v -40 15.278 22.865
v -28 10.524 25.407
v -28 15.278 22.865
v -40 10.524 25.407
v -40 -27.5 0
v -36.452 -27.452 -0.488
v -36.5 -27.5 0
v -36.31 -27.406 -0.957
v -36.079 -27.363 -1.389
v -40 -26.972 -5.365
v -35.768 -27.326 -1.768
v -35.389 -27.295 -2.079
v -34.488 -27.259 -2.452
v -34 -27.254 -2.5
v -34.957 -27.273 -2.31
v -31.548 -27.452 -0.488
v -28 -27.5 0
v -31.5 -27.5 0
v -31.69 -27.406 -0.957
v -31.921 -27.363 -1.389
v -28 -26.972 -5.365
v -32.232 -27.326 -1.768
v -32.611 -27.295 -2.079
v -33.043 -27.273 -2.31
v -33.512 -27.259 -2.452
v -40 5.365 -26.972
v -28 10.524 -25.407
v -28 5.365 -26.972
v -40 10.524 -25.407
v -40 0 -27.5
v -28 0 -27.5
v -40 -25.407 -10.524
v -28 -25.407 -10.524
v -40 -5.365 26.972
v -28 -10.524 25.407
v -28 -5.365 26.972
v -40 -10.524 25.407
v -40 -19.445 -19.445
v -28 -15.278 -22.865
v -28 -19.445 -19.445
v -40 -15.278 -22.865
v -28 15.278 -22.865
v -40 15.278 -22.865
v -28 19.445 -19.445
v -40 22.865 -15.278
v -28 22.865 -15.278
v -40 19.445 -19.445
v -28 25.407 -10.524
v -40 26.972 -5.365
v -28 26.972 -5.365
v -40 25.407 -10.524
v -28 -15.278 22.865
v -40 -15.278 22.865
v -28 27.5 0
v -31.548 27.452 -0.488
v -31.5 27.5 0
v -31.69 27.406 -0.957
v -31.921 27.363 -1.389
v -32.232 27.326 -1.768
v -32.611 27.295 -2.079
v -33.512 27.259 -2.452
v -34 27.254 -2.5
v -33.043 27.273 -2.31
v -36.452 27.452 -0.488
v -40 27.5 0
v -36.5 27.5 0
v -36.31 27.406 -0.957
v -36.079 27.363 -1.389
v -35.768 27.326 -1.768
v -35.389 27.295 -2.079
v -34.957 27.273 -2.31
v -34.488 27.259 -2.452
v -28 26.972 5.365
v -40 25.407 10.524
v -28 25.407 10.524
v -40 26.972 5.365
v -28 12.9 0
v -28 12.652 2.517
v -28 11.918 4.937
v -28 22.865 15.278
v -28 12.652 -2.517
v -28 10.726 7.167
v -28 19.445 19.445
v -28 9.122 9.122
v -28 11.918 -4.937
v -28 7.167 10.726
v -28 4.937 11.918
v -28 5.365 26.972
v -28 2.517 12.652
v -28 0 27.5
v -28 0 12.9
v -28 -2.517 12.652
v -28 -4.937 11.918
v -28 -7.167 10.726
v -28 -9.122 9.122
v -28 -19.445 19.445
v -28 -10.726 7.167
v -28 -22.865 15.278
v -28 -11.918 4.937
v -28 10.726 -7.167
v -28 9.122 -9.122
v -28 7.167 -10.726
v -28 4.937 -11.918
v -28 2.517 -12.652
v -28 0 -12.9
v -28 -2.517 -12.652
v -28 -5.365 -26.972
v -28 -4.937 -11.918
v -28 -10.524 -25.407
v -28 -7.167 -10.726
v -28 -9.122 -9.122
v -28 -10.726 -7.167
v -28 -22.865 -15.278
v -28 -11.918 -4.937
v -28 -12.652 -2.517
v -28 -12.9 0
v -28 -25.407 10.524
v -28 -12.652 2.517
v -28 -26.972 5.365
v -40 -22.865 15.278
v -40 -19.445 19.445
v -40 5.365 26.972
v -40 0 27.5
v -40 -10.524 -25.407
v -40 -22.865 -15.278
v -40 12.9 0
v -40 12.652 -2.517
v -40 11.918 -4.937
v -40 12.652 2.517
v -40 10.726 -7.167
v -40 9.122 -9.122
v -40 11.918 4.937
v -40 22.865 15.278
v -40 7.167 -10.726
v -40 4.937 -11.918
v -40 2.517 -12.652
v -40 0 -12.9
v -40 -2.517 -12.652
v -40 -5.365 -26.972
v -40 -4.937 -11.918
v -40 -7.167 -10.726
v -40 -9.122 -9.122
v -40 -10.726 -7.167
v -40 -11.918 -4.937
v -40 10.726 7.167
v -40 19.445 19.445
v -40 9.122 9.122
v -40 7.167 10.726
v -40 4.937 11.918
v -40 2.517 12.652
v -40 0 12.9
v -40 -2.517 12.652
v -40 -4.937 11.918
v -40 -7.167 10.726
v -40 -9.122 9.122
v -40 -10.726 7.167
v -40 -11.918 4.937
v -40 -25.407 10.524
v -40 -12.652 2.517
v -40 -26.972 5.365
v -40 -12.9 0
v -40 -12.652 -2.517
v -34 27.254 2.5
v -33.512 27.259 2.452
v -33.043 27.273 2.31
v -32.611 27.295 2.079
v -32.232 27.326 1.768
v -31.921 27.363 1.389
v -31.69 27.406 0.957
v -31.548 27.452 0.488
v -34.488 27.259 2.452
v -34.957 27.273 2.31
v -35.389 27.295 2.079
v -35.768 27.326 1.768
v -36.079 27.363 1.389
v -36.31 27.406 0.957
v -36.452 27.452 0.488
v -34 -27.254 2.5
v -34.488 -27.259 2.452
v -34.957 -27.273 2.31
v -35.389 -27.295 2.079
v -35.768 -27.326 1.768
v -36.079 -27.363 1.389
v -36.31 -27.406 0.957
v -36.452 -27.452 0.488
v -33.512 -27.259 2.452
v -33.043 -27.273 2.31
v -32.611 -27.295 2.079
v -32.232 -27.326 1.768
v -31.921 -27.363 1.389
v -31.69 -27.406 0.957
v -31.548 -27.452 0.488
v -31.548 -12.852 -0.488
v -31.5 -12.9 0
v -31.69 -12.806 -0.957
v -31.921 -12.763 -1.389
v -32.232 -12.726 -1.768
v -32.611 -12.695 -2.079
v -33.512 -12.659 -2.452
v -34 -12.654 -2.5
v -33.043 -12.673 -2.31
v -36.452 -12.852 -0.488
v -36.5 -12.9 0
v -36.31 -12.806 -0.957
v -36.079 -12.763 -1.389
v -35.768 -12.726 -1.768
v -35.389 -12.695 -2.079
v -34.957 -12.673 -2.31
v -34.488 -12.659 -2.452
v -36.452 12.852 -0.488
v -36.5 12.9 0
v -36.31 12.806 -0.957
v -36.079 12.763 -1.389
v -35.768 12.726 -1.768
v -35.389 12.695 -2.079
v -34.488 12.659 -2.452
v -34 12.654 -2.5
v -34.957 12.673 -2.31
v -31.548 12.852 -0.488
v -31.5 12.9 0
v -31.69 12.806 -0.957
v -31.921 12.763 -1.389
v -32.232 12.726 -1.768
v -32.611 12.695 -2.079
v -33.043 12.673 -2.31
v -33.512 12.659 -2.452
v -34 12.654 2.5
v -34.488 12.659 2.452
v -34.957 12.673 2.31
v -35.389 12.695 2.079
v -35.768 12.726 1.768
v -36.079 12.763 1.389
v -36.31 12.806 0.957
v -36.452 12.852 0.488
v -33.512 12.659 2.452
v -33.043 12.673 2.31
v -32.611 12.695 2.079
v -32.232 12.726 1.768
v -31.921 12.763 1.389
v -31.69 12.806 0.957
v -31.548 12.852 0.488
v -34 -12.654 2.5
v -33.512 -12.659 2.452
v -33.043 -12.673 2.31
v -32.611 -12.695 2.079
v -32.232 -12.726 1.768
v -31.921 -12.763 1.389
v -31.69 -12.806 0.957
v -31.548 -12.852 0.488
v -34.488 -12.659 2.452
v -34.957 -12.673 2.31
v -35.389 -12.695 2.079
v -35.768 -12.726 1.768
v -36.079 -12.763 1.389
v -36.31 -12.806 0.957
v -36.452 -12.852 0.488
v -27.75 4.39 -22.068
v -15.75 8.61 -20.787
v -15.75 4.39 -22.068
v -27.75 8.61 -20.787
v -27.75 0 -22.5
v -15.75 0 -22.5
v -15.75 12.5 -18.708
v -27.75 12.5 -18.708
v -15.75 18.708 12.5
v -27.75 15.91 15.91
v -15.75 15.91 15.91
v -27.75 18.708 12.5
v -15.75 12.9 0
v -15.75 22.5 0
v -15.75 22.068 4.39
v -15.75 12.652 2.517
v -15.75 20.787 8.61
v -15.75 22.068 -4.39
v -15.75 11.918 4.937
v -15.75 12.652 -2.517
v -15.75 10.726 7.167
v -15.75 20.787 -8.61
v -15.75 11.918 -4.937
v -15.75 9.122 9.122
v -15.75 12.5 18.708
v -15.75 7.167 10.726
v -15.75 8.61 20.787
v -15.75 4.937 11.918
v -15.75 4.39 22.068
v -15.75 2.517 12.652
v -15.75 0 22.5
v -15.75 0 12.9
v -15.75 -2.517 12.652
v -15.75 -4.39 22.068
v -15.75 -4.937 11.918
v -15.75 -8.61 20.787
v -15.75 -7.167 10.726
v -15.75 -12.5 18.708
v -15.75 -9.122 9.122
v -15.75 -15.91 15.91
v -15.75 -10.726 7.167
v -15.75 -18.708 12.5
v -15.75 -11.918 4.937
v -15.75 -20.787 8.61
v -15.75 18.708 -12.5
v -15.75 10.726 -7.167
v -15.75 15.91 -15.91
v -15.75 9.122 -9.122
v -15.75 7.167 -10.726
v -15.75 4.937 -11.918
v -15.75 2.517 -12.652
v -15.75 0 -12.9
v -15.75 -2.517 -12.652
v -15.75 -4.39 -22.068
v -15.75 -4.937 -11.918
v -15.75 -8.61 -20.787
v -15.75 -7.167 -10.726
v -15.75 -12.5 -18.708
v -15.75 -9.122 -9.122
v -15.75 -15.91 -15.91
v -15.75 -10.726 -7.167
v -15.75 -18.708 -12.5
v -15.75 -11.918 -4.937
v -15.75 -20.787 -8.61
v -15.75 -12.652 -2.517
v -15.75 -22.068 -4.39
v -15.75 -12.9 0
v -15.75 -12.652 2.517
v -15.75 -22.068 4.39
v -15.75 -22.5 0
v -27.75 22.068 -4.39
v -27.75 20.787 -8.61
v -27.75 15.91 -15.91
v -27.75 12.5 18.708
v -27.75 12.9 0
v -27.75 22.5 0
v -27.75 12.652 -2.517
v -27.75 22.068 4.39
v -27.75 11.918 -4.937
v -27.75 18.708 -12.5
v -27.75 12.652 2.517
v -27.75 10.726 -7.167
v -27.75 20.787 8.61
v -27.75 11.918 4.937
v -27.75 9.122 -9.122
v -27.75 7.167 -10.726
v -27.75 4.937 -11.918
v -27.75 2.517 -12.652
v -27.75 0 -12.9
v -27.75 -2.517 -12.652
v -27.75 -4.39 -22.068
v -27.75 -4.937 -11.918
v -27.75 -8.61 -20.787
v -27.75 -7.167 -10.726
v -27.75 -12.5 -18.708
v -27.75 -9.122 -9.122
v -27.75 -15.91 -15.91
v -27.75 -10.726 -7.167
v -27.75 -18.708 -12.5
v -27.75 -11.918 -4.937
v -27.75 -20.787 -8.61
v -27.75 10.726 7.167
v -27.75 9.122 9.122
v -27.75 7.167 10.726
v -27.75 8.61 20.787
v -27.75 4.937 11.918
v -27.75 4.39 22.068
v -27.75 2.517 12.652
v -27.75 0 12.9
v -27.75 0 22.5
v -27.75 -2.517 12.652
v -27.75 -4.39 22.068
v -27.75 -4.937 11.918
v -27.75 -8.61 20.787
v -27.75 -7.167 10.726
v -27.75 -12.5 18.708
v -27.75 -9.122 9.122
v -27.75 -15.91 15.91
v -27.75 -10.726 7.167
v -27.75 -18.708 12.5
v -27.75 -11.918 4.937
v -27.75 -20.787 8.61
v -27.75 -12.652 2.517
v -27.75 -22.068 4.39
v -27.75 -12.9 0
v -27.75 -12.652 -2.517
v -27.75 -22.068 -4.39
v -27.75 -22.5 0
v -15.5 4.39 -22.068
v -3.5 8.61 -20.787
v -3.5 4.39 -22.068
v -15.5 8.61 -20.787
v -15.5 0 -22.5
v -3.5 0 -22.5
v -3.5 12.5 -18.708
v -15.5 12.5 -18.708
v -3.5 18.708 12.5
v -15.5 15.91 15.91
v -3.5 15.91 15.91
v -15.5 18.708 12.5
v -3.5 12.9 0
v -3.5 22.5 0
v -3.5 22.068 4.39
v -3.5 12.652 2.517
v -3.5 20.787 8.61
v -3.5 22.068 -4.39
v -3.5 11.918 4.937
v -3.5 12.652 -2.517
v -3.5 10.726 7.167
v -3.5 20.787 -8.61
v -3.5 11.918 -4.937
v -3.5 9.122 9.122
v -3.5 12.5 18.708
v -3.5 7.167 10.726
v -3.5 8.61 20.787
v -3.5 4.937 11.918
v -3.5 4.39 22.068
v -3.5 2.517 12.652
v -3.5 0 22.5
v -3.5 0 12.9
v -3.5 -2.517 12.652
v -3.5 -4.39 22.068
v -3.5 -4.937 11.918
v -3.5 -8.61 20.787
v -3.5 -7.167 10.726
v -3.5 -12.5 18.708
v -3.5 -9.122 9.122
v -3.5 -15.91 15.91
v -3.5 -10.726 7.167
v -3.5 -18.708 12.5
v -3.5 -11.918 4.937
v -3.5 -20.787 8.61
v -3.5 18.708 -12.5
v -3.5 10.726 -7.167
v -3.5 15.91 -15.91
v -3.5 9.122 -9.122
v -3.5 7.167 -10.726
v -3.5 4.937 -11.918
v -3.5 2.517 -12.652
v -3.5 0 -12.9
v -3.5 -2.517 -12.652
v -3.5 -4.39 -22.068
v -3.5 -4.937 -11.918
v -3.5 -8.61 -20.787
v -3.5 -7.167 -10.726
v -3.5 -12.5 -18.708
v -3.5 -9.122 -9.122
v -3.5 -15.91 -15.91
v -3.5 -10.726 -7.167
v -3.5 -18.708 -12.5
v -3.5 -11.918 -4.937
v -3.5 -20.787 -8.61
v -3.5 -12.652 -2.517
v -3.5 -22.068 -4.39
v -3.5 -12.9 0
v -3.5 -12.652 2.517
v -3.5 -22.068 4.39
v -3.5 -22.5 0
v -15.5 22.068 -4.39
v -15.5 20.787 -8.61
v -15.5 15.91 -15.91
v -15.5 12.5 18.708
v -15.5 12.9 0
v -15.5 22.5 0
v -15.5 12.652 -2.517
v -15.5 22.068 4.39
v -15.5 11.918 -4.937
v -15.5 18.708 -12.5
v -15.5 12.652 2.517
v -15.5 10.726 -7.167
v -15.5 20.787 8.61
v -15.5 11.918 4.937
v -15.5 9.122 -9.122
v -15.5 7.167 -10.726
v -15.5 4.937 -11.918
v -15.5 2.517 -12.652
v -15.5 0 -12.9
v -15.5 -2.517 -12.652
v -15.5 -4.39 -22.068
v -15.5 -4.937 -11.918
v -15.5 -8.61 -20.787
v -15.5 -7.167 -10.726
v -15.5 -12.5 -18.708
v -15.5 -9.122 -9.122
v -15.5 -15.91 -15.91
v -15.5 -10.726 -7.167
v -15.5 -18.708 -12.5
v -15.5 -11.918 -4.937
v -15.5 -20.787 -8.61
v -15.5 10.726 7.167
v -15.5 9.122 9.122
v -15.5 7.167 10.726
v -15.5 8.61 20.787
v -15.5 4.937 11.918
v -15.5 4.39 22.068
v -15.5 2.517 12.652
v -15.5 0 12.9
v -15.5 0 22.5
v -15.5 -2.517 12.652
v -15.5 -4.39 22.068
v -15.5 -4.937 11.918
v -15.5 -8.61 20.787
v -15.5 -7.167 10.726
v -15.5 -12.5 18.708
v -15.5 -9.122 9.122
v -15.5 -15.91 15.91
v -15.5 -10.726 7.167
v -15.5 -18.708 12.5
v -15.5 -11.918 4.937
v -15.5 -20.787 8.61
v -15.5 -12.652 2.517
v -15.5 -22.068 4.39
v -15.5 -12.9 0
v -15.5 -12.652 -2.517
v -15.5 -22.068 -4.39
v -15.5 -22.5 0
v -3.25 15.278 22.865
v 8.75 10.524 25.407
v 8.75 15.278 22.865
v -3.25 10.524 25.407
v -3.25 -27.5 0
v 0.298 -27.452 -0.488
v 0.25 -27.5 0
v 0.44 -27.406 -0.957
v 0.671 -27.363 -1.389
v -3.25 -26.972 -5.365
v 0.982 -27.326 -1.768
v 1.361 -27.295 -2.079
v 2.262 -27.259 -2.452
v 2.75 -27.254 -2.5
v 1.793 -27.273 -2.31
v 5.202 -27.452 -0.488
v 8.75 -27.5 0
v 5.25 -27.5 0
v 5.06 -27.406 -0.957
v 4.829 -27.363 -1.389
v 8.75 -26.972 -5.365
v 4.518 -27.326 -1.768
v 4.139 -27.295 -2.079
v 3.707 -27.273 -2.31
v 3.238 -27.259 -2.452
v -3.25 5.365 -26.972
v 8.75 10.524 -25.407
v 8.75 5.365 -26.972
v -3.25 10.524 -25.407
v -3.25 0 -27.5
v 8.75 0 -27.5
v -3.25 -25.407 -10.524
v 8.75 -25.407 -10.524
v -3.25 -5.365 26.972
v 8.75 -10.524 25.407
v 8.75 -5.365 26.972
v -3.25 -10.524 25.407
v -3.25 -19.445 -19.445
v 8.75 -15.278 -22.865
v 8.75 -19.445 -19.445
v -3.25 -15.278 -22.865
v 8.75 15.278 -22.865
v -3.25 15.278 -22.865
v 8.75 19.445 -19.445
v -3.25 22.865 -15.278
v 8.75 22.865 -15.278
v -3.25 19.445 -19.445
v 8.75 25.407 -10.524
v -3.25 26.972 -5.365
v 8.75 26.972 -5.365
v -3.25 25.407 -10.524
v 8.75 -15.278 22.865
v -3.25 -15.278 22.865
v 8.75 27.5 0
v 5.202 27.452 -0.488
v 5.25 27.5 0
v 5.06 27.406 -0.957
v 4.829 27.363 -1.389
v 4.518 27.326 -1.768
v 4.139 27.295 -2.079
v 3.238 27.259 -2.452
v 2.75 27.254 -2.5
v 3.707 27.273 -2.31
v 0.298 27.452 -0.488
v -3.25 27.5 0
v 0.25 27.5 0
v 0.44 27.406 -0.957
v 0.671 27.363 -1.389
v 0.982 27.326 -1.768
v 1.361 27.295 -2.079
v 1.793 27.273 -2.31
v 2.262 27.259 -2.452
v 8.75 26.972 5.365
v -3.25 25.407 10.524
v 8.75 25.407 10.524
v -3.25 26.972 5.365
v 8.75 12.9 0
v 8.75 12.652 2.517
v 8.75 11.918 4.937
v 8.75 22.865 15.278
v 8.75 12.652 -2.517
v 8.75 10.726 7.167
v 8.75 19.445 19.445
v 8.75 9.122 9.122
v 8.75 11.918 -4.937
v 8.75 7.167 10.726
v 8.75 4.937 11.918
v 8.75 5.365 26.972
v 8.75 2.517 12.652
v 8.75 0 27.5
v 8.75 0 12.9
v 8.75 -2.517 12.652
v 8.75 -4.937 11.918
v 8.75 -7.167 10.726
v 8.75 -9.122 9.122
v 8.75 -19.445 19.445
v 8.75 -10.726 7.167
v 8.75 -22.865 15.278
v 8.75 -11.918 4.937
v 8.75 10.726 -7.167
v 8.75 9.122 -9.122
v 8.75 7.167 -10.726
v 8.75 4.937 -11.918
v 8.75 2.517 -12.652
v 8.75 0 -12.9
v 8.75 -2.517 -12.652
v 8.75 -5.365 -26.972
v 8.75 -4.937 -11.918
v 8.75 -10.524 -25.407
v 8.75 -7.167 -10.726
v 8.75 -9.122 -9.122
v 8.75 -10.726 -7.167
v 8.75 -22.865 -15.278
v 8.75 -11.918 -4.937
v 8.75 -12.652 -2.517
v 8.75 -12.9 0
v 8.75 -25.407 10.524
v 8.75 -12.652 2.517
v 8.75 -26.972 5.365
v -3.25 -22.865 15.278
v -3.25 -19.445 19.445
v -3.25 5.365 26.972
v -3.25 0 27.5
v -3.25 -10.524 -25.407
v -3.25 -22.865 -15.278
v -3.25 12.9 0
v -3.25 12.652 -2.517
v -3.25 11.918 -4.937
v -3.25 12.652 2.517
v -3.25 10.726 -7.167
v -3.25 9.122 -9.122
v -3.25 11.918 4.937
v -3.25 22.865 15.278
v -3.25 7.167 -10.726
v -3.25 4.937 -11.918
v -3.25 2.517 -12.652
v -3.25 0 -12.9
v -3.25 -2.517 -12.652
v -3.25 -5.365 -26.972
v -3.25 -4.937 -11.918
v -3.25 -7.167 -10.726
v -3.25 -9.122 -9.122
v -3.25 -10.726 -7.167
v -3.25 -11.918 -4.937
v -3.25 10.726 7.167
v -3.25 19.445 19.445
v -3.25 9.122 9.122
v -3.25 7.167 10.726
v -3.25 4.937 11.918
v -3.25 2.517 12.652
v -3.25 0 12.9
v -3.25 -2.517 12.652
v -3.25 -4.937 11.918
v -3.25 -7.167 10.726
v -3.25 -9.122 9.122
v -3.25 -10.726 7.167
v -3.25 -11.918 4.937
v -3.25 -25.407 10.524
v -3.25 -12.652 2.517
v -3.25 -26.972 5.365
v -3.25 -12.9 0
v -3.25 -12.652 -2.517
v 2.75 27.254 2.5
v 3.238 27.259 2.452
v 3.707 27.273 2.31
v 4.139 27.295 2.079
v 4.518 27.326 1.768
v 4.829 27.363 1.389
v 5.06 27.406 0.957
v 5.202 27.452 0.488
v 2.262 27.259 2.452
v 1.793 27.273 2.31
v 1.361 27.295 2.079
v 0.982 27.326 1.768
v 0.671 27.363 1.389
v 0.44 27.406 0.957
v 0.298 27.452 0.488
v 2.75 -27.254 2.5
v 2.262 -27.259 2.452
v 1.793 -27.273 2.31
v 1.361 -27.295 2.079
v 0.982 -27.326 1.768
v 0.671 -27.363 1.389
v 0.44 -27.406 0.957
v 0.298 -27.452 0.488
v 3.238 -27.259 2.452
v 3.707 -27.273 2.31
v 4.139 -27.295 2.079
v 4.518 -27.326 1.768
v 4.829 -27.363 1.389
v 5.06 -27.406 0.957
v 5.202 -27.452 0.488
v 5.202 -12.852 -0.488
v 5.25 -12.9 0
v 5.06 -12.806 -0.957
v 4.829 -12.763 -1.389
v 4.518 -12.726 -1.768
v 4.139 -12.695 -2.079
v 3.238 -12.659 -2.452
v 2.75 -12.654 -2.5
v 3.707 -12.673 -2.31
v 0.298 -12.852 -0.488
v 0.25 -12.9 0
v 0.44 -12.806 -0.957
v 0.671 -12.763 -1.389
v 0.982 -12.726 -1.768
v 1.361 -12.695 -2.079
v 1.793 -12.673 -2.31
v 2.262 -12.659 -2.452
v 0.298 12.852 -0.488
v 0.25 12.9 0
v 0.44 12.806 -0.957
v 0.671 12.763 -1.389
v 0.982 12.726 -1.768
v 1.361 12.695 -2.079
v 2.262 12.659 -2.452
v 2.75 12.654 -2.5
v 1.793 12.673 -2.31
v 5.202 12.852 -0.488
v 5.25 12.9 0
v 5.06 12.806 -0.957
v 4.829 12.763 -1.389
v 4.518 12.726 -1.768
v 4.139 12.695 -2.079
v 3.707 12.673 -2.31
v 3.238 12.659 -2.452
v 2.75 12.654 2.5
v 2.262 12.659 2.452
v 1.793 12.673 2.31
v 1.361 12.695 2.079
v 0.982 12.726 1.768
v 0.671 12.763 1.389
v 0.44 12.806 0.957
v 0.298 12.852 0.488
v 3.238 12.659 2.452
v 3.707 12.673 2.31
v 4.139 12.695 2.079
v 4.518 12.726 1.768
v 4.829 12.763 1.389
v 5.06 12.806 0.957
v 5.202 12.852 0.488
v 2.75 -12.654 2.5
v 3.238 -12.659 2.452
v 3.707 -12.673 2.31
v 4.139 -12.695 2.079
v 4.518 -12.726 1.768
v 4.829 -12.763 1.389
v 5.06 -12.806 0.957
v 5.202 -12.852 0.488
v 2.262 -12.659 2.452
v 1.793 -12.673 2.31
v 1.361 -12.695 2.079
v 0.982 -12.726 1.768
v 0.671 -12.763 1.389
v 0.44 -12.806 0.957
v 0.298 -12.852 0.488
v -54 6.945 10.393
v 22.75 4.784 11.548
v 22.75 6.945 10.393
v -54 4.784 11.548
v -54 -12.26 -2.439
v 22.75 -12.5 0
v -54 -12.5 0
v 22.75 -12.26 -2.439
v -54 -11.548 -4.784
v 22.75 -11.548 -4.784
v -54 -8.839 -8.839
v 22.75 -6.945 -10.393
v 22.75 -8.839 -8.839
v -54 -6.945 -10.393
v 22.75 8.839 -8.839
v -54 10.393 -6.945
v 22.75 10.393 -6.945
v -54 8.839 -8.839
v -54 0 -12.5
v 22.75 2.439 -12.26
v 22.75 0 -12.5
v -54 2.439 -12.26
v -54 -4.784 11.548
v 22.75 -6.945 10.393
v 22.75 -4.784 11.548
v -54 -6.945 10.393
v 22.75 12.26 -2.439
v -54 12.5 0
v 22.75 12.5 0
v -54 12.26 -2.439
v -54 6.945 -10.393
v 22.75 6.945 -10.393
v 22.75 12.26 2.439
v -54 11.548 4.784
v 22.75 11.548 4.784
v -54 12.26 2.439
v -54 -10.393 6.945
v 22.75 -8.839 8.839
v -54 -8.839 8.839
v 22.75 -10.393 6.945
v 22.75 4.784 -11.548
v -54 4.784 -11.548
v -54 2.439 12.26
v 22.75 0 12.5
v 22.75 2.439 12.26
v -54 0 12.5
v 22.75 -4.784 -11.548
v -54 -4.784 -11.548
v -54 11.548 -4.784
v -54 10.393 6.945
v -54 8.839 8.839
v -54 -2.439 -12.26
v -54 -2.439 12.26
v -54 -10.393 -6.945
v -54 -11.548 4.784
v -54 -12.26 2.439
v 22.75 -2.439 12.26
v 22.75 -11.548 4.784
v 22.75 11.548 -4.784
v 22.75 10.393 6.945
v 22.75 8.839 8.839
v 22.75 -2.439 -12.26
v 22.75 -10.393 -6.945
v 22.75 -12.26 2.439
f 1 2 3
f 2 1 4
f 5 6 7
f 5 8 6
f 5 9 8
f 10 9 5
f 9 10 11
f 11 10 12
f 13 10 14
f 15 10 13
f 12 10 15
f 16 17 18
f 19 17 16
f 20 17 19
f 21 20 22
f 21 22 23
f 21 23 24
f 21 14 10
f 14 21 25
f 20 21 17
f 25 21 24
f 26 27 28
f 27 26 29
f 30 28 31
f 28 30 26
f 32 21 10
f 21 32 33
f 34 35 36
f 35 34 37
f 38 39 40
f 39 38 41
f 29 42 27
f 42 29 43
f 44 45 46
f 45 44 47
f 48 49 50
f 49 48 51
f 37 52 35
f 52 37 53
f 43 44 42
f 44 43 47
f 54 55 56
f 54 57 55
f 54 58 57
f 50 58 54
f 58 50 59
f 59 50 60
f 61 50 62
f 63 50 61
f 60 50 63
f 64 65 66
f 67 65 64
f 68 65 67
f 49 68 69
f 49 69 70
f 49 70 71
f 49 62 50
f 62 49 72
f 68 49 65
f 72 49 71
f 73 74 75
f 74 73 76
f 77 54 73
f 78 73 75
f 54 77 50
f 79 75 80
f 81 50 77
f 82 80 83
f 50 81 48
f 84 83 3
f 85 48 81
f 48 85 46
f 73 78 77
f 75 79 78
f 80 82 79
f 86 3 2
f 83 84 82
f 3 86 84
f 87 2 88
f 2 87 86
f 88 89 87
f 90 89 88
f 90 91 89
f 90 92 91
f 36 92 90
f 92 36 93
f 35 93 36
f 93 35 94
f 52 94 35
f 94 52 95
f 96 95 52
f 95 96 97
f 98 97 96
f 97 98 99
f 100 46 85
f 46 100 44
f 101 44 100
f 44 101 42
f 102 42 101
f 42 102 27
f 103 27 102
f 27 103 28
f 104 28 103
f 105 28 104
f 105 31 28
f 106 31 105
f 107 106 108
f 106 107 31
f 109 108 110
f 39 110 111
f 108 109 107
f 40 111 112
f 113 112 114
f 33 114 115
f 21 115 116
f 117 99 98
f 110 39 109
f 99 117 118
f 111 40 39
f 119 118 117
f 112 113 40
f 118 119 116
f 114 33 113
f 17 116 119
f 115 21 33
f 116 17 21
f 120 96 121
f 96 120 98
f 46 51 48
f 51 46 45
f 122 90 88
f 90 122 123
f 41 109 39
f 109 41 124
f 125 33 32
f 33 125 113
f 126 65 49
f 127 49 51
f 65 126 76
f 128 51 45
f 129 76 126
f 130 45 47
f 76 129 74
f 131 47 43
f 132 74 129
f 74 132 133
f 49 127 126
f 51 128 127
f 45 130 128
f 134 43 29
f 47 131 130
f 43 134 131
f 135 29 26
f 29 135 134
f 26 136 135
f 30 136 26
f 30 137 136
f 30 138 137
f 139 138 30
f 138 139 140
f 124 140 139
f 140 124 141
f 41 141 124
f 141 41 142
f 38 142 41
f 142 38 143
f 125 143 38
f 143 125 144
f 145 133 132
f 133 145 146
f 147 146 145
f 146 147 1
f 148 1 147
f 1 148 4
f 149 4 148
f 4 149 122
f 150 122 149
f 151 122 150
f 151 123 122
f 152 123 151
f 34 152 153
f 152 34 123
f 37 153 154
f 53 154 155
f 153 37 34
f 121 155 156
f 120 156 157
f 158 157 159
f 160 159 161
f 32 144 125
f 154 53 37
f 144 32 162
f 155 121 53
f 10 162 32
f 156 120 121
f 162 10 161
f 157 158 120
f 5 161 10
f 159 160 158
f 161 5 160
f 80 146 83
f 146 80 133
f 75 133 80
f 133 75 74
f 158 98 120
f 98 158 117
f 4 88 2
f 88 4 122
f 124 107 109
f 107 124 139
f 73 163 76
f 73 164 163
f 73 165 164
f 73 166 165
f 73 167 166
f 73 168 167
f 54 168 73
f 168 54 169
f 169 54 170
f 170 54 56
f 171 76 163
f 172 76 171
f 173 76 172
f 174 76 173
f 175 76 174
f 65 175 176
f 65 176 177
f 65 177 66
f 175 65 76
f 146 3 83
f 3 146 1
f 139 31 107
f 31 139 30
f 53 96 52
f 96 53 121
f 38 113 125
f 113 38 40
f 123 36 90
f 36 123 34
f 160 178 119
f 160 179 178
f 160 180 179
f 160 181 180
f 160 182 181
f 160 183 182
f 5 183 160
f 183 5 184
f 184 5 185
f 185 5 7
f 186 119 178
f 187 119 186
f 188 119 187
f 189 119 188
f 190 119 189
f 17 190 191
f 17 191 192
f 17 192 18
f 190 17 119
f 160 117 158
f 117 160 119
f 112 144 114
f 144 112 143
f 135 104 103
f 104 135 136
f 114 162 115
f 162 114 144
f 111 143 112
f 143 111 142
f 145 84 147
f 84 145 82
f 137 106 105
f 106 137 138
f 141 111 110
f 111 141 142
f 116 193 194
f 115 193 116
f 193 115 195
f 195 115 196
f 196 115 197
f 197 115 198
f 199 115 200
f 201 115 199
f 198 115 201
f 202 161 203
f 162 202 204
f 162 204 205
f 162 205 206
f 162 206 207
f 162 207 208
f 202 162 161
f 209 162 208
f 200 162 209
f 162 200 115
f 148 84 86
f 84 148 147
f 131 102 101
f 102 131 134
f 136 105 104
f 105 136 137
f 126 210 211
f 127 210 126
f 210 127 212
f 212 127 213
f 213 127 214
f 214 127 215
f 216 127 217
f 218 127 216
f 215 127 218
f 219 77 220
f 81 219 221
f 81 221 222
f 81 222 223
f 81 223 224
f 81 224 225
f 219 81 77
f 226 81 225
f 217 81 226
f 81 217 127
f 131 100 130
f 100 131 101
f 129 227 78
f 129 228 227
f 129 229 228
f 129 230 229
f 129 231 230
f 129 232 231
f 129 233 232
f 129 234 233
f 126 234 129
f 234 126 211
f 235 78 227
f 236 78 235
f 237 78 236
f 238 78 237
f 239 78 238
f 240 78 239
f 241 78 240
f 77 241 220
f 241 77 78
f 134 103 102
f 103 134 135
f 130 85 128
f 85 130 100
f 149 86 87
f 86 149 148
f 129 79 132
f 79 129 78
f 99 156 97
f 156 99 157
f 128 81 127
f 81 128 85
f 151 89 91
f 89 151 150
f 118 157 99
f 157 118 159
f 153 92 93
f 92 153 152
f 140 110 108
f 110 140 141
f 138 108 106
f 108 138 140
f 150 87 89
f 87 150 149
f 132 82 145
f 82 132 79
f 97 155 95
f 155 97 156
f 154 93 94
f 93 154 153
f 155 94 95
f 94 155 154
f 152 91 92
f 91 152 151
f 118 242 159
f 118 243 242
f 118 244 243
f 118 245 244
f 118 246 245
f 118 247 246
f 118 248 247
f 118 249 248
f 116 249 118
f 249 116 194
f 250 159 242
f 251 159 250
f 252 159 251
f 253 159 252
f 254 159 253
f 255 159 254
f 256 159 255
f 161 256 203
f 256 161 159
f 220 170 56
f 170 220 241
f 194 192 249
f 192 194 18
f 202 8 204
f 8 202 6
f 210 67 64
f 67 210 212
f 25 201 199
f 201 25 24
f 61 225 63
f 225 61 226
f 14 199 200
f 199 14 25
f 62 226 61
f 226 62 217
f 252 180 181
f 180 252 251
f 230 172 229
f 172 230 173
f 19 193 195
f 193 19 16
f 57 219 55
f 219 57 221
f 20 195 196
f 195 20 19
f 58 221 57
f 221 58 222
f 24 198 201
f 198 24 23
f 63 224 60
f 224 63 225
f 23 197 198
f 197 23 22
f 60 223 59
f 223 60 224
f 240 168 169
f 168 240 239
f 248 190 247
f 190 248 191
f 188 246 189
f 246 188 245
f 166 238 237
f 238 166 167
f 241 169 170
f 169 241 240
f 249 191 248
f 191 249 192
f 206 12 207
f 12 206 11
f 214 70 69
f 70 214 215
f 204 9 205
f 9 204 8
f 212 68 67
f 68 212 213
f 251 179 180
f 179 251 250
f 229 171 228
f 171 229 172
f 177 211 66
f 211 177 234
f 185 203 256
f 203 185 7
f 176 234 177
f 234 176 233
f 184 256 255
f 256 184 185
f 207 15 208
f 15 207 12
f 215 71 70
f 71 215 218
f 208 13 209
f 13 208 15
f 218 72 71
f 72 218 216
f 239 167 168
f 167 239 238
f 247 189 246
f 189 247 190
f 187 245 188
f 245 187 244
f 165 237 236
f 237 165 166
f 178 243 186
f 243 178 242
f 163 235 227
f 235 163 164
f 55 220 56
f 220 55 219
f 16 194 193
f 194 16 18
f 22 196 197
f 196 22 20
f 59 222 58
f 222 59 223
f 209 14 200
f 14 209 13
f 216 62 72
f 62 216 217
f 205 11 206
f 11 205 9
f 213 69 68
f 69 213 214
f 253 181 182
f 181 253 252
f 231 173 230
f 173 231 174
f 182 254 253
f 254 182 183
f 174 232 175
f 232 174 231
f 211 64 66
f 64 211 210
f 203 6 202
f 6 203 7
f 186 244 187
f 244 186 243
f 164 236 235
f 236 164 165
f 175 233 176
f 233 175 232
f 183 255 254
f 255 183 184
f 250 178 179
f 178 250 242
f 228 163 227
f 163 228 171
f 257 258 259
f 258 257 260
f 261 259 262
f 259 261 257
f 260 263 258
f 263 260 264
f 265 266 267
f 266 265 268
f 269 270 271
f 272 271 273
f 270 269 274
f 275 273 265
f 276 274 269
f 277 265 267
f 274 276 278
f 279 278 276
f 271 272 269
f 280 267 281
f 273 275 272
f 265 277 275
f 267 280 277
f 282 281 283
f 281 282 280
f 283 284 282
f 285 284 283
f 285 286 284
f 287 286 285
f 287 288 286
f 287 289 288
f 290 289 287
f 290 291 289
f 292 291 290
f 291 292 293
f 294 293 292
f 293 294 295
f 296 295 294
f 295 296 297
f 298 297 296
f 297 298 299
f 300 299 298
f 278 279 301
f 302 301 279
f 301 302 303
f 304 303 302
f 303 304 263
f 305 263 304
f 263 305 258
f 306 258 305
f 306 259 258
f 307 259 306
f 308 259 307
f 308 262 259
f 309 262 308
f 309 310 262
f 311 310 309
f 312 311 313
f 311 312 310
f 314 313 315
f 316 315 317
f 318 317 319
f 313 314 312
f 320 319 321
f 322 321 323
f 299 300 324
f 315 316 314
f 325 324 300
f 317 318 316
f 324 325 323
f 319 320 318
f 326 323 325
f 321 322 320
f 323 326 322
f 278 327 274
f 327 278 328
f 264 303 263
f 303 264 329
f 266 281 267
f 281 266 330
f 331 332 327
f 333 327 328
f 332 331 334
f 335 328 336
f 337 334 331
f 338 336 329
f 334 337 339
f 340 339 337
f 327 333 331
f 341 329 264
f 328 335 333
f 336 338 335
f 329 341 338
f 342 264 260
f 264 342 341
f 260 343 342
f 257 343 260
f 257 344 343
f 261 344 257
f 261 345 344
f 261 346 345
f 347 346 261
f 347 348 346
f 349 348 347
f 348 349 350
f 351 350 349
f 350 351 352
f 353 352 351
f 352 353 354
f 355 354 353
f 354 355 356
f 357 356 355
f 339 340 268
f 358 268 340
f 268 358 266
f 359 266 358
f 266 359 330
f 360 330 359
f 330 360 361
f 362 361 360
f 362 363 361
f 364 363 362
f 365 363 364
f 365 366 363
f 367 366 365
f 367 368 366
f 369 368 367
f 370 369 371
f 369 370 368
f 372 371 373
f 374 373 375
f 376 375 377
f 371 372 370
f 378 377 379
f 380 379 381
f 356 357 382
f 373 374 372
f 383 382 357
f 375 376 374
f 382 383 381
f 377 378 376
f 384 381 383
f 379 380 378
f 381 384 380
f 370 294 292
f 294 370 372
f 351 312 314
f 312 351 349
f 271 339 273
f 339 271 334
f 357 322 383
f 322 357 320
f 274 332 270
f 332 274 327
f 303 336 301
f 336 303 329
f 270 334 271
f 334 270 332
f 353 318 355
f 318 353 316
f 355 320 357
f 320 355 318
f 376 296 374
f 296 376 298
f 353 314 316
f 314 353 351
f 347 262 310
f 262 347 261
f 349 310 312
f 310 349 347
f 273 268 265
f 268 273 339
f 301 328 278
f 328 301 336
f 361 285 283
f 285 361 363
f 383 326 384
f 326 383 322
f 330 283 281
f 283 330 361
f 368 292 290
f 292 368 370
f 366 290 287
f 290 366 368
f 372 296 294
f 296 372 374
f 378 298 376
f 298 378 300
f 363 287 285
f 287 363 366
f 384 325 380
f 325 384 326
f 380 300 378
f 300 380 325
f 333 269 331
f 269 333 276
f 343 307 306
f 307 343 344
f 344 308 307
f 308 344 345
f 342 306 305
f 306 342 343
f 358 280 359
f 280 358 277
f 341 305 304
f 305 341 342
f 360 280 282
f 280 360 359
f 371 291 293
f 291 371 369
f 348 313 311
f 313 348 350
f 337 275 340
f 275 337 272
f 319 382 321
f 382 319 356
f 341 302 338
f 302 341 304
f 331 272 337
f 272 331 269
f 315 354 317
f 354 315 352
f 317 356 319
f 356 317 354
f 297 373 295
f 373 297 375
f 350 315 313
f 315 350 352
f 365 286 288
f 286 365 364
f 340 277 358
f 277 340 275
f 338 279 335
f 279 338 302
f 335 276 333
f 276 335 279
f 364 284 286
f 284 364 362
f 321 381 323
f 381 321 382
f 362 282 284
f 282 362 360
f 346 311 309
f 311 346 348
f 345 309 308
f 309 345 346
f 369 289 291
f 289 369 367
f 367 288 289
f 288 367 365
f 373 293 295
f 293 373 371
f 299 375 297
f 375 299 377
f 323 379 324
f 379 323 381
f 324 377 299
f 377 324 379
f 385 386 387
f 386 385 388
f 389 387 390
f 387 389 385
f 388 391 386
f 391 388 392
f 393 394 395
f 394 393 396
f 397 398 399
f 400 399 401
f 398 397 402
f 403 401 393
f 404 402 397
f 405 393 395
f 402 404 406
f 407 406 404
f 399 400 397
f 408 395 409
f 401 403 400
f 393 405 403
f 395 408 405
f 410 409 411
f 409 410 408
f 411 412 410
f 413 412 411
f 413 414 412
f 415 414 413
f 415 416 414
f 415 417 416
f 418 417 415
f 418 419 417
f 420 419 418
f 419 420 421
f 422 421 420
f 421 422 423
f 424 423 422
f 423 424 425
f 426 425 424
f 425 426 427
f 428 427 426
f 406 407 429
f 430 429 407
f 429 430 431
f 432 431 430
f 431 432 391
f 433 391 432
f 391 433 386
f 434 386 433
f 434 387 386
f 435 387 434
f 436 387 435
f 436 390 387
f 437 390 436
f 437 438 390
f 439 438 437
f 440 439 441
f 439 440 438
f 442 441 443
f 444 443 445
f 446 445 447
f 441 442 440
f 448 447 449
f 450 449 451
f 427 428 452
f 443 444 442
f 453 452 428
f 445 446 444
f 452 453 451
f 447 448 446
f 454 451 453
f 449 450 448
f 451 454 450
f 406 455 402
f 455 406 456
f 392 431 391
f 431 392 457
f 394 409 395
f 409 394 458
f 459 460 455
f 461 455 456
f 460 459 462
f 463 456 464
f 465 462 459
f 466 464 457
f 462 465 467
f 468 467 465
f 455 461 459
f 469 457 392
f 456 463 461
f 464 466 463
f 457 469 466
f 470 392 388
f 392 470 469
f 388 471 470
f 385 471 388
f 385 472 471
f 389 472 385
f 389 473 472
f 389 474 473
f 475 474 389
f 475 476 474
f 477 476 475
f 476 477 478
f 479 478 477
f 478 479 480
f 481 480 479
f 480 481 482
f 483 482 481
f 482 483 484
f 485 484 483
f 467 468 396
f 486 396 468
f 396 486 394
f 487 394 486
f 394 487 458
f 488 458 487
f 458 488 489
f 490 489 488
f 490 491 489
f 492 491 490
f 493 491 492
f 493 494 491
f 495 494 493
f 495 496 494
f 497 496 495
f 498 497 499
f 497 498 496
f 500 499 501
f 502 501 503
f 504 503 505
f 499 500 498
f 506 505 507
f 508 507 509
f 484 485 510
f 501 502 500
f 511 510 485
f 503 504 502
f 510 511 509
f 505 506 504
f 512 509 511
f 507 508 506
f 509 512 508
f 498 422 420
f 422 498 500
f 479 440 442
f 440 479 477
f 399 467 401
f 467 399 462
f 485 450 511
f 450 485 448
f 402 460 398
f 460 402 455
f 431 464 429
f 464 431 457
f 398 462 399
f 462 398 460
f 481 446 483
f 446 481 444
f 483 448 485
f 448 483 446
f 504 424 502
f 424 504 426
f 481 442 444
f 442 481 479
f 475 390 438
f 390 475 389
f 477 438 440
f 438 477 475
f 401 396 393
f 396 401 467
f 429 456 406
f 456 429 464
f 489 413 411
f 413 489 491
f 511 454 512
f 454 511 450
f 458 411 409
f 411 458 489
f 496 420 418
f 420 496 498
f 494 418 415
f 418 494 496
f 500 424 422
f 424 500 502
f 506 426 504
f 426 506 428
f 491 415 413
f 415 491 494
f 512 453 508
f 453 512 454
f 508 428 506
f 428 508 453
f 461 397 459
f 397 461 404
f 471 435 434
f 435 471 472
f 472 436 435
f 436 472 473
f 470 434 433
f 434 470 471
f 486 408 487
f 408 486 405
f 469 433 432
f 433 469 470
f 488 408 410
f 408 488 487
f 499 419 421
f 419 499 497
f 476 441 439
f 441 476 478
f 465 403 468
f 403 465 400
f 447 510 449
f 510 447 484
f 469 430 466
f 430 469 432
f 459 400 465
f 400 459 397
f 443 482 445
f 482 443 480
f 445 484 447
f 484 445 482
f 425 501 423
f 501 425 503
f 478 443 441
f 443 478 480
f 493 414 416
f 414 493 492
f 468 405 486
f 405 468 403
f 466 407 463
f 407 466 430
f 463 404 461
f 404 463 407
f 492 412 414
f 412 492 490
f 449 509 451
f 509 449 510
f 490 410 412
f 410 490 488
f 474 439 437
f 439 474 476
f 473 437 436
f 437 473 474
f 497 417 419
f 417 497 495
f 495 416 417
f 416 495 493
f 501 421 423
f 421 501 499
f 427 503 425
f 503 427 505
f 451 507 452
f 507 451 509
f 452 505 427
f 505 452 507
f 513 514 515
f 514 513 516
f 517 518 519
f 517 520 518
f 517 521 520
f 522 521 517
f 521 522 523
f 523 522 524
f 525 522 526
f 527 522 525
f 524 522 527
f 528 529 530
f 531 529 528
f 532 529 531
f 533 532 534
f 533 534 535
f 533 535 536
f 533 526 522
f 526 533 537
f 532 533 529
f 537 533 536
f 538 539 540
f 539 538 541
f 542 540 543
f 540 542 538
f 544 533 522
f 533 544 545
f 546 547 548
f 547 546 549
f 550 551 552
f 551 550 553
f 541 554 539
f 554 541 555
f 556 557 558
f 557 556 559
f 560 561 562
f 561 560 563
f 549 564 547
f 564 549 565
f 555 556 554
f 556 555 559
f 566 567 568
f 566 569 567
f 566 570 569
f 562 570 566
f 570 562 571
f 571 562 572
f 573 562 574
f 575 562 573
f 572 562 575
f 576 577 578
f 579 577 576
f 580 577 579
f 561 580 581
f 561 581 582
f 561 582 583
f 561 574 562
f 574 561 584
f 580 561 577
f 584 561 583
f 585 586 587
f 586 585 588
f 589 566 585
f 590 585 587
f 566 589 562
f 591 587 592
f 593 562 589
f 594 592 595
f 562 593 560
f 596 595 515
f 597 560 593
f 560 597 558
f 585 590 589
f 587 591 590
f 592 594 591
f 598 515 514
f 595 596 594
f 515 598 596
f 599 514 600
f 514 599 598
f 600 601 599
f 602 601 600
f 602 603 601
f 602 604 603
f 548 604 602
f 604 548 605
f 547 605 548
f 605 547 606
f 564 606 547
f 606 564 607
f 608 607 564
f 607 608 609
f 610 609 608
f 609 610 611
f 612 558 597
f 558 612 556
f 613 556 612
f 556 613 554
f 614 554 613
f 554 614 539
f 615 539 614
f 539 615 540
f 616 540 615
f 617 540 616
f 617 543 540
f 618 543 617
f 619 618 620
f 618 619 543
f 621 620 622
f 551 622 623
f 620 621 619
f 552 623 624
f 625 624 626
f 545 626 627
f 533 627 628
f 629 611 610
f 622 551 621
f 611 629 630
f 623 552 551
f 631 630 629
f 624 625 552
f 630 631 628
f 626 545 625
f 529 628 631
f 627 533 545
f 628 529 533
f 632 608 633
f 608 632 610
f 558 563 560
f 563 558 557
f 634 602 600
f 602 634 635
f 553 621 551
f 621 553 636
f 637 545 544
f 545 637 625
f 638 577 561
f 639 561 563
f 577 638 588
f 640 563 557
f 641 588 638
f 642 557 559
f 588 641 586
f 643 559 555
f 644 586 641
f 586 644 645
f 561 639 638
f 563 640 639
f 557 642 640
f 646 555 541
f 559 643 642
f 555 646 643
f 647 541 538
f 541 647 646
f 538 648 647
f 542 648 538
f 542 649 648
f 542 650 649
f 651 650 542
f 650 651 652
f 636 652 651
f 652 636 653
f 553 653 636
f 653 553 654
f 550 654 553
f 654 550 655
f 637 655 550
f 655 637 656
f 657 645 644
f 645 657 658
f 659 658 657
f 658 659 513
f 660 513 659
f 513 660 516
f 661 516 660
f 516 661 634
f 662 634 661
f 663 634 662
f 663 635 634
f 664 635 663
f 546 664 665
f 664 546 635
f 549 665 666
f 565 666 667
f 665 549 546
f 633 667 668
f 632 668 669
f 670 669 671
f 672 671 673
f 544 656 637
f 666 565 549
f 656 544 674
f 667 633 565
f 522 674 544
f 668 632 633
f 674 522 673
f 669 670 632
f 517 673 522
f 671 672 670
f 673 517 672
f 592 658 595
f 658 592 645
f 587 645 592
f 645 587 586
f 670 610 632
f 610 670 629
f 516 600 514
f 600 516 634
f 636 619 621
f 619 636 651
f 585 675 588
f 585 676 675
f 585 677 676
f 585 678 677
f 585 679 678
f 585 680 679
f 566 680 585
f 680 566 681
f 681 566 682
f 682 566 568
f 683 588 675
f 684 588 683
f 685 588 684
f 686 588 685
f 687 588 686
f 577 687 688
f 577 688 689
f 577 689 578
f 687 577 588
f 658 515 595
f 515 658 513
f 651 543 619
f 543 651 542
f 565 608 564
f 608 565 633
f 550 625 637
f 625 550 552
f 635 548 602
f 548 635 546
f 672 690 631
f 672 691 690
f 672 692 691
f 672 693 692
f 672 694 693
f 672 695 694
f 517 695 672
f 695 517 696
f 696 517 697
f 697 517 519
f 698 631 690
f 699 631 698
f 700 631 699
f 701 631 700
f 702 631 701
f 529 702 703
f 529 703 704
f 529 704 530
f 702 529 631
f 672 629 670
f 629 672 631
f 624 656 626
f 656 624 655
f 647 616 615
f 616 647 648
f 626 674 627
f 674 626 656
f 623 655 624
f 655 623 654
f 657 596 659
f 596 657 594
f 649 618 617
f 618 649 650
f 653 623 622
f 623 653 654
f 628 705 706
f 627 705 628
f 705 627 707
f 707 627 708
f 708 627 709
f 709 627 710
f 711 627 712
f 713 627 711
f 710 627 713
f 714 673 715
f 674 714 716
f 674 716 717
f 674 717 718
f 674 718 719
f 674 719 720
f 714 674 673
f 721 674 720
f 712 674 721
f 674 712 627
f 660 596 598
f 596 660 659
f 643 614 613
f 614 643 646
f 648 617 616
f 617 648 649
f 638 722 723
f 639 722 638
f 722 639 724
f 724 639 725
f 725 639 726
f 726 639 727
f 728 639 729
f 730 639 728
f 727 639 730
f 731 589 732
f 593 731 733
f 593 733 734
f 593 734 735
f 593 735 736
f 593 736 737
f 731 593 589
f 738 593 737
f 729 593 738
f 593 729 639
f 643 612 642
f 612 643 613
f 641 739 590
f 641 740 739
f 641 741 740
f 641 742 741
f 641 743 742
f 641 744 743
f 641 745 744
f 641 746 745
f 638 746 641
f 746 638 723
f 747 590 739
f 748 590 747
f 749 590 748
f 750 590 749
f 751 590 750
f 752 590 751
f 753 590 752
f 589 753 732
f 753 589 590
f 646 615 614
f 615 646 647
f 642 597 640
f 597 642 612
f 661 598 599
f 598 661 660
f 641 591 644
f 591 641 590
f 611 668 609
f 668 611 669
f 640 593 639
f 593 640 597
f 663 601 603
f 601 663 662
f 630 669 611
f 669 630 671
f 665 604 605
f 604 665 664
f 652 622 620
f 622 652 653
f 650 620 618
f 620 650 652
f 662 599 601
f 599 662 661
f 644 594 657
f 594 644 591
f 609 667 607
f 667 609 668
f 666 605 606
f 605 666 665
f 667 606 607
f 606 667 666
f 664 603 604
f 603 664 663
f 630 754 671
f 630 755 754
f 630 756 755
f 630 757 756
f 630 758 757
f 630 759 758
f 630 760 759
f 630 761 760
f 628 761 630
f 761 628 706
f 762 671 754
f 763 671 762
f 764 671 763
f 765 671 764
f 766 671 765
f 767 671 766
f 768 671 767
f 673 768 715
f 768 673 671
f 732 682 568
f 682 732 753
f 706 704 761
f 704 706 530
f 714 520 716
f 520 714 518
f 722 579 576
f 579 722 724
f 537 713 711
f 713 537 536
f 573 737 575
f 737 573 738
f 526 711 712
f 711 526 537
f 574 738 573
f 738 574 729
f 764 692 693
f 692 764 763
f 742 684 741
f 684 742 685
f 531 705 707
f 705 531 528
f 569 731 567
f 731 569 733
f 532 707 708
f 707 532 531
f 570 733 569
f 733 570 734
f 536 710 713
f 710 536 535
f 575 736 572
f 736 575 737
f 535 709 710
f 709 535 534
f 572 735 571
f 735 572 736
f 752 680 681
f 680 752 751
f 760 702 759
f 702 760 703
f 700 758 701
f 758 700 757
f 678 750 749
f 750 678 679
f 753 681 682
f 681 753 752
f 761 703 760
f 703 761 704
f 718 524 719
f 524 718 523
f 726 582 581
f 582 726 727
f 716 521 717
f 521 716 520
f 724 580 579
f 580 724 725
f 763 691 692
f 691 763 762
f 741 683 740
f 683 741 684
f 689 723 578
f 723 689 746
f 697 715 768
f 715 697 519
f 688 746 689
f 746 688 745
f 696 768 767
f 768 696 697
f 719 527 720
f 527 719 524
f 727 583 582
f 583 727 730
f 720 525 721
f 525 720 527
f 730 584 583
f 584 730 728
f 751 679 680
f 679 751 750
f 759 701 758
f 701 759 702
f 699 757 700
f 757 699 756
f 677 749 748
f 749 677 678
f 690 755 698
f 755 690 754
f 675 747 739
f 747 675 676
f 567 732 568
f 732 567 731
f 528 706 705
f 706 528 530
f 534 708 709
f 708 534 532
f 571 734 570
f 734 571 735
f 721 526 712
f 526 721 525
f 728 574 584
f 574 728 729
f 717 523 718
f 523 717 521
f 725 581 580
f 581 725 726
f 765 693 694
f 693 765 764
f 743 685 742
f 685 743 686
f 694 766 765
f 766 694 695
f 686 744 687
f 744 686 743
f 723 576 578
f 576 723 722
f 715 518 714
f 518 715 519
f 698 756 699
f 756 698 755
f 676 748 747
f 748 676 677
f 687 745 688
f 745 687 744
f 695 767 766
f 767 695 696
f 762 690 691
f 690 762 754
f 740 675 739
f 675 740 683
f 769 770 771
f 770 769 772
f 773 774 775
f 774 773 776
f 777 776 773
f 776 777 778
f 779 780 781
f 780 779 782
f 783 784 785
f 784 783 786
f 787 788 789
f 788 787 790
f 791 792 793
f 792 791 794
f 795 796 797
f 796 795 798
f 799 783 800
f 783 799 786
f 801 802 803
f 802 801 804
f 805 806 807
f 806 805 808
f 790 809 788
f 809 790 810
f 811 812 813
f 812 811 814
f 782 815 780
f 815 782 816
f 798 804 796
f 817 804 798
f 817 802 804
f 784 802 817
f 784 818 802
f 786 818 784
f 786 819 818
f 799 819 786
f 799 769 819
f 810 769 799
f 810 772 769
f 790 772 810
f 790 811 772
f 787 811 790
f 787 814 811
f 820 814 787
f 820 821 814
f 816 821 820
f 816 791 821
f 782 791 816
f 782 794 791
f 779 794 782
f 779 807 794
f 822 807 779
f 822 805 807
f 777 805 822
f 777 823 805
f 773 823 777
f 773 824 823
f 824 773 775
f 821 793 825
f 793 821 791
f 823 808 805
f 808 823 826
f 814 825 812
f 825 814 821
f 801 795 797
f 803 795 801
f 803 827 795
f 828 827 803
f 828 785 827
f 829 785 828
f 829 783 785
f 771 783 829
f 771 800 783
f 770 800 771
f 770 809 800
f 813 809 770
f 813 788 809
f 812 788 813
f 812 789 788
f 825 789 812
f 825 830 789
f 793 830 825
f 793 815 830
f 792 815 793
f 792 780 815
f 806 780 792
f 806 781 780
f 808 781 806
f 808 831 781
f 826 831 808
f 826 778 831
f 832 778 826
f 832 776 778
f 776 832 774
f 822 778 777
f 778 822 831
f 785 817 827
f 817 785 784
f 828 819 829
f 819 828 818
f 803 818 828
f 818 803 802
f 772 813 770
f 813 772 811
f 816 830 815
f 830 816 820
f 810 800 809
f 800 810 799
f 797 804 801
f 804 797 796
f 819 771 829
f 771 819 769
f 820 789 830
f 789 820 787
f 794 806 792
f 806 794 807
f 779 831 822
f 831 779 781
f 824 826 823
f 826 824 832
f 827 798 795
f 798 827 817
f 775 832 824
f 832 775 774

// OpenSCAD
$fn = 32;

// ------------------------------------------------------------------------
// Shaft with rings and collars: d25 shaft, 4 rings
// Every part is its own module, assembly() places them once.
// ------------------------------------------------------------------------

// --- part 1 ---
module shaft() {
  translate([0, 0, -38.375]) cylinder(h = 76.75, d = 25);
}

// --- part 2 ---
module collar_a() {
  difference() {
    cylinder(h = 12, d = 55);
    translate([0, 0, -1]) cylinder(h = 14, d = 25.8);
    translate([0, 0, 6]) rotate([90, 0, 0]) cylinder(h = 57, d = 5, center = true);
  }
}

// --- part 3 ---
module spacer_a() {
  difference() {
      translate([0, 0, 0]) cylinder(h = 12, d = 45);
      translate([0, 0, -1]) cylinder(h = 14, d = 25.8);
    }
}

// --- part 4 ---
module spacer_b() {
  difference() {
      translate([0, 0, 0]) cylinder(h = 12, d = 45);
      translate([0, 0, -1]) cylinder(h = 14, d = 25.8);
    }
}

// --- part 5 ---
module collar_b() {
  difference() {
    cylinder(h = 12, d = 55);
    translate([0, 0, -1]) cylinder(h = 14, d = 25.8);
    translate([0, 0, 6]) rotate([90, 0, 0]) cylinder(h = 57, d = 5, center = true);
  }
}

// --- assembly ---
module assembly() {
  translate([-15.625, 0, 0]) rotate([0, 90, 0]) shaft();
  translate([-40, 0, 0]) rotate([0, 90, 0]) collar_a();
  translate([-27.75, 0, 0]) rotate([0, 90, 0]) spacer_a();
  translate([-15.5, 0, 0]) rotate([0, 90, 0]) spacer_b();
  translate([-3.25, 0, 0]) rotate([0, 90, 0]) collar_b();
}

assembly();
